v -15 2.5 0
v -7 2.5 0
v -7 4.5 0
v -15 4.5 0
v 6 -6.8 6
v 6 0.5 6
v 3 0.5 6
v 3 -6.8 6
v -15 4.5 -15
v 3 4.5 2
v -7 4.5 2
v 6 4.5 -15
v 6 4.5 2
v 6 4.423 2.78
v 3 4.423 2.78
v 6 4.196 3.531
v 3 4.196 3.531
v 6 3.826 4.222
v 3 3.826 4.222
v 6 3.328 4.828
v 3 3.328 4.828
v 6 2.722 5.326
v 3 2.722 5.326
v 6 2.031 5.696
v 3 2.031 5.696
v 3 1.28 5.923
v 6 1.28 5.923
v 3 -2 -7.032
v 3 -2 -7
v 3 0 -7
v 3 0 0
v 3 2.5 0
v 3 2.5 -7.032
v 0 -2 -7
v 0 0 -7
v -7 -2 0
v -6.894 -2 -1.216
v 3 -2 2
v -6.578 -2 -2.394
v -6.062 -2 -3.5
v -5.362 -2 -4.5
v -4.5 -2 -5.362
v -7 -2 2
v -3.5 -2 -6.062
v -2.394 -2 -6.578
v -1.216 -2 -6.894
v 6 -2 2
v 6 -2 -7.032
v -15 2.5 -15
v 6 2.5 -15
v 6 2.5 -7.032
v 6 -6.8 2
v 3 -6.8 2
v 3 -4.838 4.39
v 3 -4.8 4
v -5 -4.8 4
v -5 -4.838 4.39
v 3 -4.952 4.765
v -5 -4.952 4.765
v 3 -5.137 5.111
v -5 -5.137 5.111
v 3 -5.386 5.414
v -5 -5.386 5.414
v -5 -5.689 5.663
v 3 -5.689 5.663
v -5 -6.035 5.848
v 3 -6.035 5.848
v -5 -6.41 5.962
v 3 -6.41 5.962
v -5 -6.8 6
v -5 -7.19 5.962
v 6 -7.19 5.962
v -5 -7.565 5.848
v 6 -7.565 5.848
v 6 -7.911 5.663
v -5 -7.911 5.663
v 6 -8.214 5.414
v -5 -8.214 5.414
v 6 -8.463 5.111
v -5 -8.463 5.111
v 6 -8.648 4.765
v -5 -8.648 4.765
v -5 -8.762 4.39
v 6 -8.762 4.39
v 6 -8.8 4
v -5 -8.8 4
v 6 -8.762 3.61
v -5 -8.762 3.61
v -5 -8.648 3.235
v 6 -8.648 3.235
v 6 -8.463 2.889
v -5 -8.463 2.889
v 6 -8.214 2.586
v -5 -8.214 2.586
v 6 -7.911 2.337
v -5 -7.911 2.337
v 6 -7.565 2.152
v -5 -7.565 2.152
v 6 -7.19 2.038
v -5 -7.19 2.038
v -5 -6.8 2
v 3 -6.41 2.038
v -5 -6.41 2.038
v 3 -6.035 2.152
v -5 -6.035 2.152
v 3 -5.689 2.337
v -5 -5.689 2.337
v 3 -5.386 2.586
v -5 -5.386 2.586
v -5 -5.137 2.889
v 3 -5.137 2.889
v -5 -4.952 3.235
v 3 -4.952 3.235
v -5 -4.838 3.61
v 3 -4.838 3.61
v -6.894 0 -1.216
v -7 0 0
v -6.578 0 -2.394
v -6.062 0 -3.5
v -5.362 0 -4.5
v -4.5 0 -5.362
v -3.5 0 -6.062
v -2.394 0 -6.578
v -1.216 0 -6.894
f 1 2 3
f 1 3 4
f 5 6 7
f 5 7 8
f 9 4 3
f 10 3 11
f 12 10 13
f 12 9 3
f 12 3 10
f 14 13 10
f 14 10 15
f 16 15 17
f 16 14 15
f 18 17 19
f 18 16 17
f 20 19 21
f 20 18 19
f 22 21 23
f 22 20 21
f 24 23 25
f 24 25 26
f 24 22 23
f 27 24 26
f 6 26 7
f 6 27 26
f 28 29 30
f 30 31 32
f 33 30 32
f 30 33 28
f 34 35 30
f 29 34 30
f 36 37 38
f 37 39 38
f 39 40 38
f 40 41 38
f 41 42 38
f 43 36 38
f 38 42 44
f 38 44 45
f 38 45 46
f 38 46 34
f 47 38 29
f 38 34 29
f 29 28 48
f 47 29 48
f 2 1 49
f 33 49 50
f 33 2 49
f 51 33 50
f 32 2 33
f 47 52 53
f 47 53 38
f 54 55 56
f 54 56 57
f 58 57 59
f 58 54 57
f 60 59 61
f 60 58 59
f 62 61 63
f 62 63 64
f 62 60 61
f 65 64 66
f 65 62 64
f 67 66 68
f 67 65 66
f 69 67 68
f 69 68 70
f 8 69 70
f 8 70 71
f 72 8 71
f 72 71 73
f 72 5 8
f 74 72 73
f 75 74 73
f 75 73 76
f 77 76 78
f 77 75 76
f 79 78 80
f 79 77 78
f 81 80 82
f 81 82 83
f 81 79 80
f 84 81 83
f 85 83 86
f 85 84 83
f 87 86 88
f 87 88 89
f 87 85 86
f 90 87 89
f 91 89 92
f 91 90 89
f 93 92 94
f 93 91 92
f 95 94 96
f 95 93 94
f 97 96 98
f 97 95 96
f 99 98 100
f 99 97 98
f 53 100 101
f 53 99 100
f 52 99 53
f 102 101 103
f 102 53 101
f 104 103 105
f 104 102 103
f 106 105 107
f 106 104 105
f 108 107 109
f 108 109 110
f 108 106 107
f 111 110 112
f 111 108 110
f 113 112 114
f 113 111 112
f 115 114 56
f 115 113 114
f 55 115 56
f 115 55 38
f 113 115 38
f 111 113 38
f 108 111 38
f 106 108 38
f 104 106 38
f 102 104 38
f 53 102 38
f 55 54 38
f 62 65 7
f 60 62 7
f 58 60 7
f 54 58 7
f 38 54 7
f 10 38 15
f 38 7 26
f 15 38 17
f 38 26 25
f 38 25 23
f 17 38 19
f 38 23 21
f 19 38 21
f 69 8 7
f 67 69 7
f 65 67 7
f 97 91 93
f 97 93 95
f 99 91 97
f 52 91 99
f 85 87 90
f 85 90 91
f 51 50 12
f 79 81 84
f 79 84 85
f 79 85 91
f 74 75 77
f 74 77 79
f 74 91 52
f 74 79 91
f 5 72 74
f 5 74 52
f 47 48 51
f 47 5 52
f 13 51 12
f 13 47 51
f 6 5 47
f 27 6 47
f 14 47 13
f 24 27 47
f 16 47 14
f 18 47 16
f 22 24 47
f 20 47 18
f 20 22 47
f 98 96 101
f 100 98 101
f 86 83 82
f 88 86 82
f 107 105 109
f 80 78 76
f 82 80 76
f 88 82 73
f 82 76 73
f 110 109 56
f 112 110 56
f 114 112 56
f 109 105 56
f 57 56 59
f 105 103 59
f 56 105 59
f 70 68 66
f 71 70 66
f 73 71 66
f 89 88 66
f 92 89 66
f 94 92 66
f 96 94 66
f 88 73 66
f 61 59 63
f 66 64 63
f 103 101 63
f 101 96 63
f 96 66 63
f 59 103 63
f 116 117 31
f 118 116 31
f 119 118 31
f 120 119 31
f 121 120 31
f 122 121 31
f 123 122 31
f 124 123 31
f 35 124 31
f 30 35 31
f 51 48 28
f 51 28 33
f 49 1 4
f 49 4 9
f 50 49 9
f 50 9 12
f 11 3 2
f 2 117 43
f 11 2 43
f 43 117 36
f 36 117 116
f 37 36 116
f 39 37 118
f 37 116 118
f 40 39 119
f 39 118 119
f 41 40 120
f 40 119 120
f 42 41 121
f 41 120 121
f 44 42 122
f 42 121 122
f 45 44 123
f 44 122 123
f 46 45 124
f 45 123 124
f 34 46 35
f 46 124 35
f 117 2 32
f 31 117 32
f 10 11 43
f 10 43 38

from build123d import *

# Parameters (mm, degrees)
F3_DEPTH  = 2
F4_DEPTH  = 2
F5_W      = 13
F5_H      = 4.5
F5_H_2    = 2
F6_DEPTH  = 2
F7_R      = 2
F8_DEPTH  = 11
F10_DEPTH = 3


with BuildPart() as f3:
    # F0 (on Front) → F3 (new body)
    with BuildSketch(Plane.XZ):
        with BuildLine():
            Line((0, 0), (-7, 0))
            ThreePointArc((-7, 0), (-4.9497474683, -4.9497474683), (0, -7))
            Line((0, -7), (6, -7))
            Line((6, -7), (6, 0))
            Line((6, 0), (0, 0))
        make_face()
    extrude(amount=F3_DEPTH)



with BuildPart() as f4:
    # F2 (on offset) → F4 (new body)
    with BuildSketch(Plane.XZ.offset(-2.5)):
        Polygon((6, 0), (0, 0), (-15, 0), (-15, -15), (0, -15), (6, -15), align=None)
    extrude(amount=-F4_DEPTH)


with BuildPart() as f6:
    # F5 (on face) → F6 (new body)
    with BuildSketch(Plane.XY):
        with Locations((-0.5, 2.25)):
            Rectangle(F5_W, F5_H)
        with Locations((-0.5, -1)):
            Rectangle(F5_W, F5_H_2)
    extrude(amount=F6_DEPTH)


with BuildPart() as f8:
    # F7 (on face) → F8 (new body)
    with BuildSketch(Plane.YZ.offset(6)):
        with Locations((-6.8, 4)):
            Circle(F7_R)
    extrude(amount=-F8_DEPTH)


with BuildPart() as f3_1:
    add(f3.part)

    add(f4.part)  # F10 merges F4

    add(f6.part)  # F10 merges F6

    add(f8.part)  # F10 merges F8
    # F9 (on face) → F10 (join)
    with BuildSketch(Plane.YZ.offset(6)):
        with BuildLine():
            Line((-6.8, 2), (-2, 2))
            Line((-2, 2), (-2, -7.0320754312))
            Line((-2, -7.0320754312), (4.5, -7.0320754312))
            Line((4.5, -7.0320754312), (4.5, 2))
            ThreePointArc((4.5, 2), (3.3284271247, 4.8284271247), (0.5, 6))
            Line((0.5, 6), (-6.8, 6))
            ThreePointArc((-6.8, 6), (-5.3857864376, 5.4142135624), (-4.8, 4))
            ThreePointArc((-4.8, 4), (-5.3857864376, 2.5857864376), (-6.8, 2))
        make_face()
    extrude(amount=-F10_DEPTH)


solid = f3_1.part
